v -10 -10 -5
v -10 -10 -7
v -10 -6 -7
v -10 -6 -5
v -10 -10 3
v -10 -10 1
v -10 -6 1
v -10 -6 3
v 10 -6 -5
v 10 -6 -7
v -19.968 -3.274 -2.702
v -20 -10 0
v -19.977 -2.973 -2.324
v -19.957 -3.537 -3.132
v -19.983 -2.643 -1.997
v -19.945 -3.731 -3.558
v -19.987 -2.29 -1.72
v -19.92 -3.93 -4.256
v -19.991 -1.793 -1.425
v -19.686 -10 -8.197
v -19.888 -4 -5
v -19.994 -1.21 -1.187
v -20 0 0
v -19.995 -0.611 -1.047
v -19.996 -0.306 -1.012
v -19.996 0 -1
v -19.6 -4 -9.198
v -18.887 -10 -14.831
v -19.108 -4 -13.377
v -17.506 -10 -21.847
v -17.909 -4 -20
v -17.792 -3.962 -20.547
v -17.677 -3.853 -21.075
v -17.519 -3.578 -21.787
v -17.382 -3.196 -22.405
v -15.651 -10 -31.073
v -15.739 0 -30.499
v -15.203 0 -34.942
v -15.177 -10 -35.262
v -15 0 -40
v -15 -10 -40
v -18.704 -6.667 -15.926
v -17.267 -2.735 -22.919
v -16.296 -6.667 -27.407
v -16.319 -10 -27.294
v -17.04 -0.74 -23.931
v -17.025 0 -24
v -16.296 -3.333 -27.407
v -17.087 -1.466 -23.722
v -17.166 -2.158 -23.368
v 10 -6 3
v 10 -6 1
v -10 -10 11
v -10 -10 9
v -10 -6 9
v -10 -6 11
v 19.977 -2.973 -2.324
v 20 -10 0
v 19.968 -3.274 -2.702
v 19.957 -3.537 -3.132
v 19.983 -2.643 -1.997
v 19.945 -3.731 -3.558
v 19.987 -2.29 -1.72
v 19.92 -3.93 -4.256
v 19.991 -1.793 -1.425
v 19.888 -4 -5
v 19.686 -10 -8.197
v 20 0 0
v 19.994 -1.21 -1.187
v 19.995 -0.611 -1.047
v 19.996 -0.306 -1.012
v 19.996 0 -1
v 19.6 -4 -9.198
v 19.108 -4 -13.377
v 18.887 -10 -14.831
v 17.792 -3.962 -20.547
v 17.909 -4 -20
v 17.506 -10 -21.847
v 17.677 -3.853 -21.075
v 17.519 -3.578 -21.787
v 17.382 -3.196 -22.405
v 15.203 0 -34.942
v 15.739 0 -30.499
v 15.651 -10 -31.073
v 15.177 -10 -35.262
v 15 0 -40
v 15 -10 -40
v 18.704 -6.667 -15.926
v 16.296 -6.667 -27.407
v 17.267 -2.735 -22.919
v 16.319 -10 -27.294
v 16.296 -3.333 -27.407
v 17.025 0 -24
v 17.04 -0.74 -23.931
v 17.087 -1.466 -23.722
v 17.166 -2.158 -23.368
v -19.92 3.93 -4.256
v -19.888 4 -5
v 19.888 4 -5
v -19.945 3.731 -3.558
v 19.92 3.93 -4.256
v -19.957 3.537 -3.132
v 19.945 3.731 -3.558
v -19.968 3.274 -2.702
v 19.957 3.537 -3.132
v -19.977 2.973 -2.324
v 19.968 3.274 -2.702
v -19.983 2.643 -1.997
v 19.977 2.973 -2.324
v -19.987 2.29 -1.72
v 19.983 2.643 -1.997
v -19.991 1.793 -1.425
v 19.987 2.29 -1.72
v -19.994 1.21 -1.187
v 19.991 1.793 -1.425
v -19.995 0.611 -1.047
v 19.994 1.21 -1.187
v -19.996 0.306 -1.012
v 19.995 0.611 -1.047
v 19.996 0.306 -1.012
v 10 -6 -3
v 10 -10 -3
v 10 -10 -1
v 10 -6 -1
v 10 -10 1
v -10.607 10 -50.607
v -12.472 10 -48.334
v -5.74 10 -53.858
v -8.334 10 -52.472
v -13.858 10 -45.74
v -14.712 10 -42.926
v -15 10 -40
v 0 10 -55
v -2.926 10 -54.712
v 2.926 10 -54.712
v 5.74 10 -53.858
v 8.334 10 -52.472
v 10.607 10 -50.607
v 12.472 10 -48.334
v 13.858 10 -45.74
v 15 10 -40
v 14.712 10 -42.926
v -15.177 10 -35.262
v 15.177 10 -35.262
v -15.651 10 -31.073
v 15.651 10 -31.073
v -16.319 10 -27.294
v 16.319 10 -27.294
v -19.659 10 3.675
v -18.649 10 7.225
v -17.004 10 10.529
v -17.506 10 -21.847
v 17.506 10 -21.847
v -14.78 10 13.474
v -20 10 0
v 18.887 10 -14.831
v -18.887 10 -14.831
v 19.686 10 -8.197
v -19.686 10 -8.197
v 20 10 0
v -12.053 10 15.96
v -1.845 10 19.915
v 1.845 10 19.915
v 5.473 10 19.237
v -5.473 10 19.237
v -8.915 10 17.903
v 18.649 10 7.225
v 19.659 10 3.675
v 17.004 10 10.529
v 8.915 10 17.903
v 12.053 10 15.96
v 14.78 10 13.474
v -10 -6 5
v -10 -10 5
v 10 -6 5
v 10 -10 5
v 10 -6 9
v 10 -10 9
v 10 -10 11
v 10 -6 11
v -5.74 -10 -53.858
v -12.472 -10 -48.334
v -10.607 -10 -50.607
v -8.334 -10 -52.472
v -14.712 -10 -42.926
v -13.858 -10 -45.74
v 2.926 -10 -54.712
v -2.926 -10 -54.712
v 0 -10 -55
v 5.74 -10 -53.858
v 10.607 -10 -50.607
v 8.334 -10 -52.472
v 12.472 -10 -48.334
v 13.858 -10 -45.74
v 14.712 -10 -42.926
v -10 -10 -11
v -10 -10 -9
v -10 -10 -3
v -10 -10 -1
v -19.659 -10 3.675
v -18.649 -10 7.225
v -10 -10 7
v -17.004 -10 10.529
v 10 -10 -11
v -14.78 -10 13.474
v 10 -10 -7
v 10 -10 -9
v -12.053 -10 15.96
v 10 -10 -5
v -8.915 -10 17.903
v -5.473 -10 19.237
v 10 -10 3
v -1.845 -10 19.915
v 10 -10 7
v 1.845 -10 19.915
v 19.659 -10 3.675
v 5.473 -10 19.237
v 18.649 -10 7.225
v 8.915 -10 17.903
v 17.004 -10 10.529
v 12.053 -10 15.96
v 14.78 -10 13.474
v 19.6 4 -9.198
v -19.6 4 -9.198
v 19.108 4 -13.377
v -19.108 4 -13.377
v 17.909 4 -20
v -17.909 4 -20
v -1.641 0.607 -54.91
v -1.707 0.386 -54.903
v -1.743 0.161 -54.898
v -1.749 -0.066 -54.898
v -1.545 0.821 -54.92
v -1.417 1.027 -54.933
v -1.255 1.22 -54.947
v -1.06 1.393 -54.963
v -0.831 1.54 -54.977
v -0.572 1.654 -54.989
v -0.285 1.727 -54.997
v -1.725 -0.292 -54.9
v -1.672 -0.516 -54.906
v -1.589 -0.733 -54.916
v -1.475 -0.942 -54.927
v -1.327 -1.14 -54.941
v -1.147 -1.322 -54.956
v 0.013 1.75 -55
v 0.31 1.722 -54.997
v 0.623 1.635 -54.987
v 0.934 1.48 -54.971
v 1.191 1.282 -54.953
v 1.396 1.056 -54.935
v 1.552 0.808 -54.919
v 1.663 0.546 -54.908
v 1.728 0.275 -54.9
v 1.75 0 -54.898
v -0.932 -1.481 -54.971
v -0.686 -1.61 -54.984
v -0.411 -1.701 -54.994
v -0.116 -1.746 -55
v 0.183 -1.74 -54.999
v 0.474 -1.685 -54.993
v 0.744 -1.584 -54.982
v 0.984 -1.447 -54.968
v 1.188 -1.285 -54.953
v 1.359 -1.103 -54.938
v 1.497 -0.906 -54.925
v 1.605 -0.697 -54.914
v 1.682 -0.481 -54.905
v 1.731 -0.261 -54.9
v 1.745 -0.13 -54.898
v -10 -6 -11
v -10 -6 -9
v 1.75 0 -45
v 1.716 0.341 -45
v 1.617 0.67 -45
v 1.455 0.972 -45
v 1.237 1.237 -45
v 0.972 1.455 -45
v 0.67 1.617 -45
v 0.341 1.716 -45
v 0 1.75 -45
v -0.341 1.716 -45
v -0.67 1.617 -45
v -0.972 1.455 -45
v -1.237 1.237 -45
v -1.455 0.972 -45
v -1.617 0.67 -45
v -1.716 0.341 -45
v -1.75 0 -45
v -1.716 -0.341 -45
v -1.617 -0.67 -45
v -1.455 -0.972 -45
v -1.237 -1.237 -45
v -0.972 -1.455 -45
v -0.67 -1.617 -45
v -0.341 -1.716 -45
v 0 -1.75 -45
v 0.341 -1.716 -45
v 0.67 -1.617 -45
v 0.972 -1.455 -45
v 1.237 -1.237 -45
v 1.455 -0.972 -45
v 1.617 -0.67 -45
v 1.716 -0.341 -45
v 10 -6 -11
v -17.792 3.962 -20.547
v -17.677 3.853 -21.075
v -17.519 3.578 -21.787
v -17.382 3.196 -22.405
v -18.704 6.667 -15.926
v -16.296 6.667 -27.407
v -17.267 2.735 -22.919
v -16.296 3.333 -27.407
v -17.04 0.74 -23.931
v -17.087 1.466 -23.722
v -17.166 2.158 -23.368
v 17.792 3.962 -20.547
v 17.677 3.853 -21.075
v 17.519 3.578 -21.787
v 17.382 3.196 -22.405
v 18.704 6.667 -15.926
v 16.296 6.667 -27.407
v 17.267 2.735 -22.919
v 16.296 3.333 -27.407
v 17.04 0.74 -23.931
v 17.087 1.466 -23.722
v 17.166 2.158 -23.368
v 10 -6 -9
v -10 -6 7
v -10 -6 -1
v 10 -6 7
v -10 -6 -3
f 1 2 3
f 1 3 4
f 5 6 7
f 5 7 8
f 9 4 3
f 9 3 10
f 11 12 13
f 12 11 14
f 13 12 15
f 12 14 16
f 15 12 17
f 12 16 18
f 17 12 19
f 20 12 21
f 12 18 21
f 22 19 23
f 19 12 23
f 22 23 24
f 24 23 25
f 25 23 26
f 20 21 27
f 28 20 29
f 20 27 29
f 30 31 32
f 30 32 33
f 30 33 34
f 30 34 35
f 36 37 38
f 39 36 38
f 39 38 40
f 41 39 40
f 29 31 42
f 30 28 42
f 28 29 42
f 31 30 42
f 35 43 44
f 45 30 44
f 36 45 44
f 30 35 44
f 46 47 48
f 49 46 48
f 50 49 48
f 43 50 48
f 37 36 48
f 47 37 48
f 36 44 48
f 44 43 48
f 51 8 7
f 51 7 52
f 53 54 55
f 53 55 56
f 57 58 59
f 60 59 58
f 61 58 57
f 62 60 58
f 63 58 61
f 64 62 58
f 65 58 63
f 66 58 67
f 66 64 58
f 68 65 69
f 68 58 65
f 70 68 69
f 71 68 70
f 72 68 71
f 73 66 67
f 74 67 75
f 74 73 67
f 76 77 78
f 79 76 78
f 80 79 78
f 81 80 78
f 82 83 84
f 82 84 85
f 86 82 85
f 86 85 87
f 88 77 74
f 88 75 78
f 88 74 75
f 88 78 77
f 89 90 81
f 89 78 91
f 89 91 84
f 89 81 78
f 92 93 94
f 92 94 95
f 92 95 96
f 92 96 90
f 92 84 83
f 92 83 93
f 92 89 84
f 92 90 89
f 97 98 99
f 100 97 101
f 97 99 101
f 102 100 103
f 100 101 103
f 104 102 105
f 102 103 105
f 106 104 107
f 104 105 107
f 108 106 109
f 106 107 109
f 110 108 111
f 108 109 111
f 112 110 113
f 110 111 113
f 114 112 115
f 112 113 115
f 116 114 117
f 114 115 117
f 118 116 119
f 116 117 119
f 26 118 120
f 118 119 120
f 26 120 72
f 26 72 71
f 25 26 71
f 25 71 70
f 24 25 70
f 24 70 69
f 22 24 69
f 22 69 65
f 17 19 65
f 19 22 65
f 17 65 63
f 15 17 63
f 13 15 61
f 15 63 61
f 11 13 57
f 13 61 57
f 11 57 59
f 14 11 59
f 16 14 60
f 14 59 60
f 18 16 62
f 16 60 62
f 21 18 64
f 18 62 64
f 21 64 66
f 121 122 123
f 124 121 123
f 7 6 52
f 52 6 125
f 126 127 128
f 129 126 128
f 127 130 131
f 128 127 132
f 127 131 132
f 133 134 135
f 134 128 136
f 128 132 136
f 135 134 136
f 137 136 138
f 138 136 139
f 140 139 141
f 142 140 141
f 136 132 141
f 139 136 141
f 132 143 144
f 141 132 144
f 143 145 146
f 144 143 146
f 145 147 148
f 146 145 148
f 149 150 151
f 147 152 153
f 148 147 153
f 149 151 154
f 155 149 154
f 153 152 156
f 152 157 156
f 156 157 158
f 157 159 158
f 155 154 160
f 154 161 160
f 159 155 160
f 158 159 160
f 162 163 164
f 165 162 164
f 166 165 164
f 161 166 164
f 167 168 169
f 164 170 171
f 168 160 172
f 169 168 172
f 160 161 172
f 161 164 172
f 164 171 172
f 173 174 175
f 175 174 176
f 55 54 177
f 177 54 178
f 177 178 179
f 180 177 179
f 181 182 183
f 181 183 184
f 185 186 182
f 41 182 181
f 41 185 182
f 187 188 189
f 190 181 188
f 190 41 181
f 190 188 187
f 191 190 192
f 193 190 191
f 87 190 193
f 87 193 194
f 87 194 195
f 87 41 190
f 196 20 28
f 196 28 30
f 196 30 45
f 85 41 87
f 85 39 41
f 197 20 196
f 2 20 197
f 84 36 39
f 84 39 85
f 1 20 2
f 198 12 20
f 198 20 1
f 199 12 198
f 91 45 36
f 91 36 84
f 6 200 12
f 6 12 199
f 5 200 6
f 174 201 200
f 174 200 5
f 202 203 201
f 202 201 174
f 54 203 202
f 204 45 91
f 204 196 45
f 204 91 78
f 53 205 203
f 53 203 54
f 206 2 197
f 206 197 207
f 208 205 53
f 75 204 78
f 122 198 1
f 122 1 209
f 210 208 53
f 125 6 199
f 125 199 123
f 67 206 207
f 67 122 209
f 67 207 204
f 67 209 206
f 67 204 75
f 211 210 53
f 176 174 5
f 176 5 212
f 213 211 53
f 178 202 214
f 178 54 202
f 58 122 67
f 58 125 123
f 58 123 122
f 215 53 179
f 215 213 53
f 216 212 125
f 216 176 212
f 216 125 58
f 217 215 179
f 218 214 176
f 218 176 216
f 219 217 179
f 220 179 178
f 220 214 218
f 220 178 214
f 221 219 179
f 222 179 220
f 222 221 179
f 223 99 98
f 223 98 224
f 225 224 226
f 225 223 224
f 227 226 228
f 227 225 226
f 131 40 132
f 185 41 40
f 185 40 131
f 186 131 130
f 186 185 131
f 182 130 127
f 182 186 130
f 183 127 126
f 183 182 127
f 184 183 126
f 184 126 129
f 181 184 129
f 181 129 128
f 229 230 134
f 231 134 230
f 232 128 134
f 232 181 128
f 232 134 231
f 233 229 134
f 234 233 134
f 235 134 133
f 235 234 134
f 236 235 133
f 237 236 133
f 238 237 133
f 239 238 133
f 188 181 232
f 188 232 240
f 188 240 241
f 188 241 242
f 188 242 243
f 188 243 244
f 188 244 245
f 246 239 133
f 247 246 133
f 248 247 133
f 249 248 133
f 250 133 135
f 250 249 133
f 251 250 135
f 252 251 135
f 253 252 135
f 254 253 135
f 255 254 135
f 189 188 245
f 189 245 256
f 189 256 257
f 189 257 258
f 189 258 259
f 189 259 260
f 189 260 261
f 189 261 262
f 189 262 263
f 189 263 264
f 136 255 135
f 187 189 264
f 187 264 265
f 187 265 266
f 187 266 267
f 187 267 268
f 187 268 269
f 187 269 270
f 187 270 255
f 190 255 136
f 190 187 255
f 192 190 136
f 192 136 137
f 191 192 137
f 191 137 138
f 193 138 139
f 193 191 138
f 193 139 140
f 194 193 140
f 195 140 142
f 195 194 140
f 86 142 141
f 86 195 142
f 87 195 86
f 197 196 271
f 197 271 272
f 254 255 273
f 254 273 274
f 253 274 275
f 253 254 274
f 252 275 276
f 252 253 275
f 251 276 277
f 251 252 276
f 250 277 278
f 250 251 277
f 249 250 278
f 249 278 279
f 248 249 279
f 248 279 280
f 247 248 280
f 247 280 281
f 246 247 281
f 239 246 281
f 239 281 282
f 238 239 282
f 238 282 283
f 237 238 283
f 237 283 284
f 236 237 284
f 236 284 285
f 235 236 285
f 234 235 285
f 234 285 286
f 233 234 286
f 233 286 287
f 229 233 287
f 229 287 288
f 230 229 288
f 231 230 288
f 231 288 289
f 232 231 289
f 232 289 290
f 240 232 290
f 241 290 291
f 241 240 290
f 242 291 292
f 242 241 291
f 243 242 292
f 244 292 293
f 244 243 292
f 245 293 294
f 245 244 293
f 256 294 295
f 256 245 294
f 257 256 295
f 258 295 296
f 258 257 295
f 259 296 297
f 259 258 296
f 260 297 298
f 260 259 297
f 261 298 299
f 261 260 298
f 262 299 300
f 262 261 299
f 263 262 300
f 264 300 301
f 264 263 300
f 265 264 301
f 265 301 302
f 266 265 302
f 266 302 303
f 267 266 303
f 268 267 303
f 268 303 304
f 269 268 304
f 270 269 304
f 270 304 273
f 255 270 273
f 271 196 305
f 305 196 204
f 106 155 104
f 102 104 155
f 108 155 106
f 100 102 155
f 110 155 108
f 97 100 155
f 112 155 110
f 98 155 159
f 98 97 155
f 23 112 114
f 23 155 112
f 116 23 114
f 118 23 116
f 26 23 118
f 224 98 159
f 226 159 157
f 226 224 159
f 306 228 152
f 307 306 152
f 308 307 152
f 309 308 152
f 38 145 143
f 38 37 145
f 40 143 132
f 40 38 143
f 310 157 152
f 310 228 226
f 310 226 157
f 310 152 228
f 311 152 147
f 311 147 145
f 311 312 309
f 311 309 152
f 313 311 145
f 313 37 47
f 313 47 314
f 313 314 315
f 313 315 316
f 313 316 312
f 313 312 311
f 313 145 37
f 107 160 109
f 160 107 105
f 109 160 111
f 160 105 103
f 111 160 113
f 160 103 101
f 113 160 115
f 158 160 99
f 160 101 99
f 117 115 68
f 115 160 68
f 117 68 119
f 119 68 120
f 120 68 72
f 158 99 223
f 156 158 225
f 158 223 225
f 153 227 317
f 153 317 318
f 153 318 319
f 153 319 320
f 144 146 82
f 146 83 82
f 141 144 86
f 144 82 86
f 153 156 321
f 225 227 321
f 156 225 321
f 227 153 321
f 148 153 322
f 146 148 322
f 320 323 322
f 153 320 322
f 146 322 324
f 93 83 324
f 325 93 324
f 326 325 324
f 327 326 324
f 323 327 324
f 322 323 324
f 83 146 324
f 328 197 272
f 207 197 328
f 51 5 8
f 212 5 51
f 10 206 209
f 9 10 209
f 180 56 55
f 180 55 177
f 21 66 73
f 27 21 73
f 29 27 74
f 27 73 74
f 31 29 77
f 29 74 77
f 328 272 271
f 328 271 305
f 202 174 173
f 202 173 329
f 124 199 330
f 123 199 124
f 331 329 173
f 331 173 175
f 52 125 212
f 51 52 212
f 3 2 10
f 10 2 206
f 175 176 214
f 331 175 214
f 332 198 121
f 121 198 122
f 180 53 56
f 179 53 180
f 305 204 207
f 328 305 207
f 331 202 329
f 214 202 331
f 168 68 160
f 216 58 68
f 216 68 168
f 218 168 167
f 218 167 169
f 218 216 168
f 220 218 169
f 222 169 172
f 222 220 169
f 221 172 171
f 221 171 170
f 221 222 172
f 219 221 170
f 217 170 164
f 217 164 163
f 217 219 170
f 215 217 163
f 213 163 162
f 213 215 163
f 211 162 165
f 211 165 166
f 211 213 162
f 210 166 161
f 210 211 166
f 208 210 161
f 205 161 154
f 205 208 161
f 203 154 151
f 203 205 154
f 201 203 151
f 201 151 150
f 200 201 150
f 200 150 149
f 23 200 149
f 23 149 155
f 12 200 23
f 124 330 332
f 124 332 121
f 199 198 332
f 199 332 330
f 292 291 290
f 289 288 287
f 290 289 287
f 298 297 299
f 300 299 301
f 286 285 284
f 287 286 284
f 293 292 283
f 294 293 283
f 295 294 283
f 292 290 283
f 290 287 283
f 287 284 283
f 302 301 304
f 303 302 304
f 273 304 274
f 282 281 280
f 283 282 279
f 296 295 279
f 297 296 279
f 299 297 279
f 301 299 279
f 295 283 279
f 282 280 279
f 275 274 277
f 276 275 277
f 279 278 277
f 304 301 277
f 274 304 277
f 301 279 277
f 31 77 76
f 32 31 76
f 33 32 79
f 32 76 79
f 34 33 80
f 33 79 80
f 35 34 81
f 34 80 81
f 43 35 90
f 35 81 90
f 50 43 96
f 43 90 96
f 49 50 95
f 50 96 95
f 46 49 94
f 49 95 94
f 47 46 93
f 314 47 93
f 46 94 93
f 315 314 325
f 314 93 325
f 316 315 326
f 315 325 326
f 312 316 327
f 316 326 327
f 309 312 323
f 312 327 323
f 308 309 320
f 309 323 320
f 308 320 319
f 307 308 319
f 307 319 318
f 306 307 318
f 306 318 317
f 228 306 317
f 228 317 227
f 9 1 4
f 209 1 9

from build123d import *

# Parameters (mm, degrees)
PAD_DEPTH           = 10
SKETCH001_W         = 20
SKETCH001_H         = 2
POCKET_DEPTH        = 4
LINEARPATTERN_COUNT = 6
LINEARPATTERN_PITCH = 4
POCKET001_DEPTH     = 50
SKETCH003_R         = 1.75
POCKET002_DEPTH     = 10


with BuildPart() as part:
    # Sketch → Pad (new body, symmetric)
    with BuildSketch(Plane.XZ):
        with BuildLine():
            ThreePointArc((20, 0), (0, 20), (-20, 0))
            add(Edge.make_bspline(
                [(-20, 0), (-20, -20), (-15, -25), (-15, -40)],
                knots=[0, 0, 0, 0, 1, 1, 1, 1], degree=3))
            ThreePointArc((-15, -40), (0, -55), (15, -40))
            add(Edge.make_bspline(
                [(20, 0), (20, -20), (15, -25), (15, -40)],
                knots=[0, 0, 0, 0, 1, 1, 1, 1], degree=3))
        make_face()
    extrude(amount=PAD_DEPTH, both=True)

    # Sketch001 (on Face6 of Pad) → Pocket (cut)
    with BuildSketch(Plane.XZ.offset(10)):
        with Locations((0, 10)):
            Rectangle(SKETCH001_W, SKETCH001_H)
    pocket = extrude(amount=-POCKET_DEPTH, mode=Mode.SUBTRACT)

    # LinearPattern: Pocket ×6
    with Locations(*[(0, 0, -i * LINEARPATTERN_PITCH) for i in range(1, LINEARPATTERN_COUNT)]):
        add(pocket, mode=Mode.SUBTRACT)

    # Sketch002 → Pocket001 (cut, symmetric)
    with BuildSketch(Plane.YZ):
        with BuildLine():
            ThreePointArc((4, -5), (0, -1), (-4, -5))
            Line((-4, -5), (-4, -20))
            ThreePointArc((-4, -20), (0, -24), (4, -20))
            Line((4, -5), (4, -20))
        make_face()
    extrude(amount=POCKET001_DEPTH, both=True, mode=Mode.SUBTRACT)

    # Sketch003 → Pocket002 (cut)
    with BuildSketch(Plane.XY.offset(-55)):
        Circle(SKETCH003_R)
    extrude(amount=POCKET002_DEPTH, mode=Mode.SUBTRACT)


solid = part.part
